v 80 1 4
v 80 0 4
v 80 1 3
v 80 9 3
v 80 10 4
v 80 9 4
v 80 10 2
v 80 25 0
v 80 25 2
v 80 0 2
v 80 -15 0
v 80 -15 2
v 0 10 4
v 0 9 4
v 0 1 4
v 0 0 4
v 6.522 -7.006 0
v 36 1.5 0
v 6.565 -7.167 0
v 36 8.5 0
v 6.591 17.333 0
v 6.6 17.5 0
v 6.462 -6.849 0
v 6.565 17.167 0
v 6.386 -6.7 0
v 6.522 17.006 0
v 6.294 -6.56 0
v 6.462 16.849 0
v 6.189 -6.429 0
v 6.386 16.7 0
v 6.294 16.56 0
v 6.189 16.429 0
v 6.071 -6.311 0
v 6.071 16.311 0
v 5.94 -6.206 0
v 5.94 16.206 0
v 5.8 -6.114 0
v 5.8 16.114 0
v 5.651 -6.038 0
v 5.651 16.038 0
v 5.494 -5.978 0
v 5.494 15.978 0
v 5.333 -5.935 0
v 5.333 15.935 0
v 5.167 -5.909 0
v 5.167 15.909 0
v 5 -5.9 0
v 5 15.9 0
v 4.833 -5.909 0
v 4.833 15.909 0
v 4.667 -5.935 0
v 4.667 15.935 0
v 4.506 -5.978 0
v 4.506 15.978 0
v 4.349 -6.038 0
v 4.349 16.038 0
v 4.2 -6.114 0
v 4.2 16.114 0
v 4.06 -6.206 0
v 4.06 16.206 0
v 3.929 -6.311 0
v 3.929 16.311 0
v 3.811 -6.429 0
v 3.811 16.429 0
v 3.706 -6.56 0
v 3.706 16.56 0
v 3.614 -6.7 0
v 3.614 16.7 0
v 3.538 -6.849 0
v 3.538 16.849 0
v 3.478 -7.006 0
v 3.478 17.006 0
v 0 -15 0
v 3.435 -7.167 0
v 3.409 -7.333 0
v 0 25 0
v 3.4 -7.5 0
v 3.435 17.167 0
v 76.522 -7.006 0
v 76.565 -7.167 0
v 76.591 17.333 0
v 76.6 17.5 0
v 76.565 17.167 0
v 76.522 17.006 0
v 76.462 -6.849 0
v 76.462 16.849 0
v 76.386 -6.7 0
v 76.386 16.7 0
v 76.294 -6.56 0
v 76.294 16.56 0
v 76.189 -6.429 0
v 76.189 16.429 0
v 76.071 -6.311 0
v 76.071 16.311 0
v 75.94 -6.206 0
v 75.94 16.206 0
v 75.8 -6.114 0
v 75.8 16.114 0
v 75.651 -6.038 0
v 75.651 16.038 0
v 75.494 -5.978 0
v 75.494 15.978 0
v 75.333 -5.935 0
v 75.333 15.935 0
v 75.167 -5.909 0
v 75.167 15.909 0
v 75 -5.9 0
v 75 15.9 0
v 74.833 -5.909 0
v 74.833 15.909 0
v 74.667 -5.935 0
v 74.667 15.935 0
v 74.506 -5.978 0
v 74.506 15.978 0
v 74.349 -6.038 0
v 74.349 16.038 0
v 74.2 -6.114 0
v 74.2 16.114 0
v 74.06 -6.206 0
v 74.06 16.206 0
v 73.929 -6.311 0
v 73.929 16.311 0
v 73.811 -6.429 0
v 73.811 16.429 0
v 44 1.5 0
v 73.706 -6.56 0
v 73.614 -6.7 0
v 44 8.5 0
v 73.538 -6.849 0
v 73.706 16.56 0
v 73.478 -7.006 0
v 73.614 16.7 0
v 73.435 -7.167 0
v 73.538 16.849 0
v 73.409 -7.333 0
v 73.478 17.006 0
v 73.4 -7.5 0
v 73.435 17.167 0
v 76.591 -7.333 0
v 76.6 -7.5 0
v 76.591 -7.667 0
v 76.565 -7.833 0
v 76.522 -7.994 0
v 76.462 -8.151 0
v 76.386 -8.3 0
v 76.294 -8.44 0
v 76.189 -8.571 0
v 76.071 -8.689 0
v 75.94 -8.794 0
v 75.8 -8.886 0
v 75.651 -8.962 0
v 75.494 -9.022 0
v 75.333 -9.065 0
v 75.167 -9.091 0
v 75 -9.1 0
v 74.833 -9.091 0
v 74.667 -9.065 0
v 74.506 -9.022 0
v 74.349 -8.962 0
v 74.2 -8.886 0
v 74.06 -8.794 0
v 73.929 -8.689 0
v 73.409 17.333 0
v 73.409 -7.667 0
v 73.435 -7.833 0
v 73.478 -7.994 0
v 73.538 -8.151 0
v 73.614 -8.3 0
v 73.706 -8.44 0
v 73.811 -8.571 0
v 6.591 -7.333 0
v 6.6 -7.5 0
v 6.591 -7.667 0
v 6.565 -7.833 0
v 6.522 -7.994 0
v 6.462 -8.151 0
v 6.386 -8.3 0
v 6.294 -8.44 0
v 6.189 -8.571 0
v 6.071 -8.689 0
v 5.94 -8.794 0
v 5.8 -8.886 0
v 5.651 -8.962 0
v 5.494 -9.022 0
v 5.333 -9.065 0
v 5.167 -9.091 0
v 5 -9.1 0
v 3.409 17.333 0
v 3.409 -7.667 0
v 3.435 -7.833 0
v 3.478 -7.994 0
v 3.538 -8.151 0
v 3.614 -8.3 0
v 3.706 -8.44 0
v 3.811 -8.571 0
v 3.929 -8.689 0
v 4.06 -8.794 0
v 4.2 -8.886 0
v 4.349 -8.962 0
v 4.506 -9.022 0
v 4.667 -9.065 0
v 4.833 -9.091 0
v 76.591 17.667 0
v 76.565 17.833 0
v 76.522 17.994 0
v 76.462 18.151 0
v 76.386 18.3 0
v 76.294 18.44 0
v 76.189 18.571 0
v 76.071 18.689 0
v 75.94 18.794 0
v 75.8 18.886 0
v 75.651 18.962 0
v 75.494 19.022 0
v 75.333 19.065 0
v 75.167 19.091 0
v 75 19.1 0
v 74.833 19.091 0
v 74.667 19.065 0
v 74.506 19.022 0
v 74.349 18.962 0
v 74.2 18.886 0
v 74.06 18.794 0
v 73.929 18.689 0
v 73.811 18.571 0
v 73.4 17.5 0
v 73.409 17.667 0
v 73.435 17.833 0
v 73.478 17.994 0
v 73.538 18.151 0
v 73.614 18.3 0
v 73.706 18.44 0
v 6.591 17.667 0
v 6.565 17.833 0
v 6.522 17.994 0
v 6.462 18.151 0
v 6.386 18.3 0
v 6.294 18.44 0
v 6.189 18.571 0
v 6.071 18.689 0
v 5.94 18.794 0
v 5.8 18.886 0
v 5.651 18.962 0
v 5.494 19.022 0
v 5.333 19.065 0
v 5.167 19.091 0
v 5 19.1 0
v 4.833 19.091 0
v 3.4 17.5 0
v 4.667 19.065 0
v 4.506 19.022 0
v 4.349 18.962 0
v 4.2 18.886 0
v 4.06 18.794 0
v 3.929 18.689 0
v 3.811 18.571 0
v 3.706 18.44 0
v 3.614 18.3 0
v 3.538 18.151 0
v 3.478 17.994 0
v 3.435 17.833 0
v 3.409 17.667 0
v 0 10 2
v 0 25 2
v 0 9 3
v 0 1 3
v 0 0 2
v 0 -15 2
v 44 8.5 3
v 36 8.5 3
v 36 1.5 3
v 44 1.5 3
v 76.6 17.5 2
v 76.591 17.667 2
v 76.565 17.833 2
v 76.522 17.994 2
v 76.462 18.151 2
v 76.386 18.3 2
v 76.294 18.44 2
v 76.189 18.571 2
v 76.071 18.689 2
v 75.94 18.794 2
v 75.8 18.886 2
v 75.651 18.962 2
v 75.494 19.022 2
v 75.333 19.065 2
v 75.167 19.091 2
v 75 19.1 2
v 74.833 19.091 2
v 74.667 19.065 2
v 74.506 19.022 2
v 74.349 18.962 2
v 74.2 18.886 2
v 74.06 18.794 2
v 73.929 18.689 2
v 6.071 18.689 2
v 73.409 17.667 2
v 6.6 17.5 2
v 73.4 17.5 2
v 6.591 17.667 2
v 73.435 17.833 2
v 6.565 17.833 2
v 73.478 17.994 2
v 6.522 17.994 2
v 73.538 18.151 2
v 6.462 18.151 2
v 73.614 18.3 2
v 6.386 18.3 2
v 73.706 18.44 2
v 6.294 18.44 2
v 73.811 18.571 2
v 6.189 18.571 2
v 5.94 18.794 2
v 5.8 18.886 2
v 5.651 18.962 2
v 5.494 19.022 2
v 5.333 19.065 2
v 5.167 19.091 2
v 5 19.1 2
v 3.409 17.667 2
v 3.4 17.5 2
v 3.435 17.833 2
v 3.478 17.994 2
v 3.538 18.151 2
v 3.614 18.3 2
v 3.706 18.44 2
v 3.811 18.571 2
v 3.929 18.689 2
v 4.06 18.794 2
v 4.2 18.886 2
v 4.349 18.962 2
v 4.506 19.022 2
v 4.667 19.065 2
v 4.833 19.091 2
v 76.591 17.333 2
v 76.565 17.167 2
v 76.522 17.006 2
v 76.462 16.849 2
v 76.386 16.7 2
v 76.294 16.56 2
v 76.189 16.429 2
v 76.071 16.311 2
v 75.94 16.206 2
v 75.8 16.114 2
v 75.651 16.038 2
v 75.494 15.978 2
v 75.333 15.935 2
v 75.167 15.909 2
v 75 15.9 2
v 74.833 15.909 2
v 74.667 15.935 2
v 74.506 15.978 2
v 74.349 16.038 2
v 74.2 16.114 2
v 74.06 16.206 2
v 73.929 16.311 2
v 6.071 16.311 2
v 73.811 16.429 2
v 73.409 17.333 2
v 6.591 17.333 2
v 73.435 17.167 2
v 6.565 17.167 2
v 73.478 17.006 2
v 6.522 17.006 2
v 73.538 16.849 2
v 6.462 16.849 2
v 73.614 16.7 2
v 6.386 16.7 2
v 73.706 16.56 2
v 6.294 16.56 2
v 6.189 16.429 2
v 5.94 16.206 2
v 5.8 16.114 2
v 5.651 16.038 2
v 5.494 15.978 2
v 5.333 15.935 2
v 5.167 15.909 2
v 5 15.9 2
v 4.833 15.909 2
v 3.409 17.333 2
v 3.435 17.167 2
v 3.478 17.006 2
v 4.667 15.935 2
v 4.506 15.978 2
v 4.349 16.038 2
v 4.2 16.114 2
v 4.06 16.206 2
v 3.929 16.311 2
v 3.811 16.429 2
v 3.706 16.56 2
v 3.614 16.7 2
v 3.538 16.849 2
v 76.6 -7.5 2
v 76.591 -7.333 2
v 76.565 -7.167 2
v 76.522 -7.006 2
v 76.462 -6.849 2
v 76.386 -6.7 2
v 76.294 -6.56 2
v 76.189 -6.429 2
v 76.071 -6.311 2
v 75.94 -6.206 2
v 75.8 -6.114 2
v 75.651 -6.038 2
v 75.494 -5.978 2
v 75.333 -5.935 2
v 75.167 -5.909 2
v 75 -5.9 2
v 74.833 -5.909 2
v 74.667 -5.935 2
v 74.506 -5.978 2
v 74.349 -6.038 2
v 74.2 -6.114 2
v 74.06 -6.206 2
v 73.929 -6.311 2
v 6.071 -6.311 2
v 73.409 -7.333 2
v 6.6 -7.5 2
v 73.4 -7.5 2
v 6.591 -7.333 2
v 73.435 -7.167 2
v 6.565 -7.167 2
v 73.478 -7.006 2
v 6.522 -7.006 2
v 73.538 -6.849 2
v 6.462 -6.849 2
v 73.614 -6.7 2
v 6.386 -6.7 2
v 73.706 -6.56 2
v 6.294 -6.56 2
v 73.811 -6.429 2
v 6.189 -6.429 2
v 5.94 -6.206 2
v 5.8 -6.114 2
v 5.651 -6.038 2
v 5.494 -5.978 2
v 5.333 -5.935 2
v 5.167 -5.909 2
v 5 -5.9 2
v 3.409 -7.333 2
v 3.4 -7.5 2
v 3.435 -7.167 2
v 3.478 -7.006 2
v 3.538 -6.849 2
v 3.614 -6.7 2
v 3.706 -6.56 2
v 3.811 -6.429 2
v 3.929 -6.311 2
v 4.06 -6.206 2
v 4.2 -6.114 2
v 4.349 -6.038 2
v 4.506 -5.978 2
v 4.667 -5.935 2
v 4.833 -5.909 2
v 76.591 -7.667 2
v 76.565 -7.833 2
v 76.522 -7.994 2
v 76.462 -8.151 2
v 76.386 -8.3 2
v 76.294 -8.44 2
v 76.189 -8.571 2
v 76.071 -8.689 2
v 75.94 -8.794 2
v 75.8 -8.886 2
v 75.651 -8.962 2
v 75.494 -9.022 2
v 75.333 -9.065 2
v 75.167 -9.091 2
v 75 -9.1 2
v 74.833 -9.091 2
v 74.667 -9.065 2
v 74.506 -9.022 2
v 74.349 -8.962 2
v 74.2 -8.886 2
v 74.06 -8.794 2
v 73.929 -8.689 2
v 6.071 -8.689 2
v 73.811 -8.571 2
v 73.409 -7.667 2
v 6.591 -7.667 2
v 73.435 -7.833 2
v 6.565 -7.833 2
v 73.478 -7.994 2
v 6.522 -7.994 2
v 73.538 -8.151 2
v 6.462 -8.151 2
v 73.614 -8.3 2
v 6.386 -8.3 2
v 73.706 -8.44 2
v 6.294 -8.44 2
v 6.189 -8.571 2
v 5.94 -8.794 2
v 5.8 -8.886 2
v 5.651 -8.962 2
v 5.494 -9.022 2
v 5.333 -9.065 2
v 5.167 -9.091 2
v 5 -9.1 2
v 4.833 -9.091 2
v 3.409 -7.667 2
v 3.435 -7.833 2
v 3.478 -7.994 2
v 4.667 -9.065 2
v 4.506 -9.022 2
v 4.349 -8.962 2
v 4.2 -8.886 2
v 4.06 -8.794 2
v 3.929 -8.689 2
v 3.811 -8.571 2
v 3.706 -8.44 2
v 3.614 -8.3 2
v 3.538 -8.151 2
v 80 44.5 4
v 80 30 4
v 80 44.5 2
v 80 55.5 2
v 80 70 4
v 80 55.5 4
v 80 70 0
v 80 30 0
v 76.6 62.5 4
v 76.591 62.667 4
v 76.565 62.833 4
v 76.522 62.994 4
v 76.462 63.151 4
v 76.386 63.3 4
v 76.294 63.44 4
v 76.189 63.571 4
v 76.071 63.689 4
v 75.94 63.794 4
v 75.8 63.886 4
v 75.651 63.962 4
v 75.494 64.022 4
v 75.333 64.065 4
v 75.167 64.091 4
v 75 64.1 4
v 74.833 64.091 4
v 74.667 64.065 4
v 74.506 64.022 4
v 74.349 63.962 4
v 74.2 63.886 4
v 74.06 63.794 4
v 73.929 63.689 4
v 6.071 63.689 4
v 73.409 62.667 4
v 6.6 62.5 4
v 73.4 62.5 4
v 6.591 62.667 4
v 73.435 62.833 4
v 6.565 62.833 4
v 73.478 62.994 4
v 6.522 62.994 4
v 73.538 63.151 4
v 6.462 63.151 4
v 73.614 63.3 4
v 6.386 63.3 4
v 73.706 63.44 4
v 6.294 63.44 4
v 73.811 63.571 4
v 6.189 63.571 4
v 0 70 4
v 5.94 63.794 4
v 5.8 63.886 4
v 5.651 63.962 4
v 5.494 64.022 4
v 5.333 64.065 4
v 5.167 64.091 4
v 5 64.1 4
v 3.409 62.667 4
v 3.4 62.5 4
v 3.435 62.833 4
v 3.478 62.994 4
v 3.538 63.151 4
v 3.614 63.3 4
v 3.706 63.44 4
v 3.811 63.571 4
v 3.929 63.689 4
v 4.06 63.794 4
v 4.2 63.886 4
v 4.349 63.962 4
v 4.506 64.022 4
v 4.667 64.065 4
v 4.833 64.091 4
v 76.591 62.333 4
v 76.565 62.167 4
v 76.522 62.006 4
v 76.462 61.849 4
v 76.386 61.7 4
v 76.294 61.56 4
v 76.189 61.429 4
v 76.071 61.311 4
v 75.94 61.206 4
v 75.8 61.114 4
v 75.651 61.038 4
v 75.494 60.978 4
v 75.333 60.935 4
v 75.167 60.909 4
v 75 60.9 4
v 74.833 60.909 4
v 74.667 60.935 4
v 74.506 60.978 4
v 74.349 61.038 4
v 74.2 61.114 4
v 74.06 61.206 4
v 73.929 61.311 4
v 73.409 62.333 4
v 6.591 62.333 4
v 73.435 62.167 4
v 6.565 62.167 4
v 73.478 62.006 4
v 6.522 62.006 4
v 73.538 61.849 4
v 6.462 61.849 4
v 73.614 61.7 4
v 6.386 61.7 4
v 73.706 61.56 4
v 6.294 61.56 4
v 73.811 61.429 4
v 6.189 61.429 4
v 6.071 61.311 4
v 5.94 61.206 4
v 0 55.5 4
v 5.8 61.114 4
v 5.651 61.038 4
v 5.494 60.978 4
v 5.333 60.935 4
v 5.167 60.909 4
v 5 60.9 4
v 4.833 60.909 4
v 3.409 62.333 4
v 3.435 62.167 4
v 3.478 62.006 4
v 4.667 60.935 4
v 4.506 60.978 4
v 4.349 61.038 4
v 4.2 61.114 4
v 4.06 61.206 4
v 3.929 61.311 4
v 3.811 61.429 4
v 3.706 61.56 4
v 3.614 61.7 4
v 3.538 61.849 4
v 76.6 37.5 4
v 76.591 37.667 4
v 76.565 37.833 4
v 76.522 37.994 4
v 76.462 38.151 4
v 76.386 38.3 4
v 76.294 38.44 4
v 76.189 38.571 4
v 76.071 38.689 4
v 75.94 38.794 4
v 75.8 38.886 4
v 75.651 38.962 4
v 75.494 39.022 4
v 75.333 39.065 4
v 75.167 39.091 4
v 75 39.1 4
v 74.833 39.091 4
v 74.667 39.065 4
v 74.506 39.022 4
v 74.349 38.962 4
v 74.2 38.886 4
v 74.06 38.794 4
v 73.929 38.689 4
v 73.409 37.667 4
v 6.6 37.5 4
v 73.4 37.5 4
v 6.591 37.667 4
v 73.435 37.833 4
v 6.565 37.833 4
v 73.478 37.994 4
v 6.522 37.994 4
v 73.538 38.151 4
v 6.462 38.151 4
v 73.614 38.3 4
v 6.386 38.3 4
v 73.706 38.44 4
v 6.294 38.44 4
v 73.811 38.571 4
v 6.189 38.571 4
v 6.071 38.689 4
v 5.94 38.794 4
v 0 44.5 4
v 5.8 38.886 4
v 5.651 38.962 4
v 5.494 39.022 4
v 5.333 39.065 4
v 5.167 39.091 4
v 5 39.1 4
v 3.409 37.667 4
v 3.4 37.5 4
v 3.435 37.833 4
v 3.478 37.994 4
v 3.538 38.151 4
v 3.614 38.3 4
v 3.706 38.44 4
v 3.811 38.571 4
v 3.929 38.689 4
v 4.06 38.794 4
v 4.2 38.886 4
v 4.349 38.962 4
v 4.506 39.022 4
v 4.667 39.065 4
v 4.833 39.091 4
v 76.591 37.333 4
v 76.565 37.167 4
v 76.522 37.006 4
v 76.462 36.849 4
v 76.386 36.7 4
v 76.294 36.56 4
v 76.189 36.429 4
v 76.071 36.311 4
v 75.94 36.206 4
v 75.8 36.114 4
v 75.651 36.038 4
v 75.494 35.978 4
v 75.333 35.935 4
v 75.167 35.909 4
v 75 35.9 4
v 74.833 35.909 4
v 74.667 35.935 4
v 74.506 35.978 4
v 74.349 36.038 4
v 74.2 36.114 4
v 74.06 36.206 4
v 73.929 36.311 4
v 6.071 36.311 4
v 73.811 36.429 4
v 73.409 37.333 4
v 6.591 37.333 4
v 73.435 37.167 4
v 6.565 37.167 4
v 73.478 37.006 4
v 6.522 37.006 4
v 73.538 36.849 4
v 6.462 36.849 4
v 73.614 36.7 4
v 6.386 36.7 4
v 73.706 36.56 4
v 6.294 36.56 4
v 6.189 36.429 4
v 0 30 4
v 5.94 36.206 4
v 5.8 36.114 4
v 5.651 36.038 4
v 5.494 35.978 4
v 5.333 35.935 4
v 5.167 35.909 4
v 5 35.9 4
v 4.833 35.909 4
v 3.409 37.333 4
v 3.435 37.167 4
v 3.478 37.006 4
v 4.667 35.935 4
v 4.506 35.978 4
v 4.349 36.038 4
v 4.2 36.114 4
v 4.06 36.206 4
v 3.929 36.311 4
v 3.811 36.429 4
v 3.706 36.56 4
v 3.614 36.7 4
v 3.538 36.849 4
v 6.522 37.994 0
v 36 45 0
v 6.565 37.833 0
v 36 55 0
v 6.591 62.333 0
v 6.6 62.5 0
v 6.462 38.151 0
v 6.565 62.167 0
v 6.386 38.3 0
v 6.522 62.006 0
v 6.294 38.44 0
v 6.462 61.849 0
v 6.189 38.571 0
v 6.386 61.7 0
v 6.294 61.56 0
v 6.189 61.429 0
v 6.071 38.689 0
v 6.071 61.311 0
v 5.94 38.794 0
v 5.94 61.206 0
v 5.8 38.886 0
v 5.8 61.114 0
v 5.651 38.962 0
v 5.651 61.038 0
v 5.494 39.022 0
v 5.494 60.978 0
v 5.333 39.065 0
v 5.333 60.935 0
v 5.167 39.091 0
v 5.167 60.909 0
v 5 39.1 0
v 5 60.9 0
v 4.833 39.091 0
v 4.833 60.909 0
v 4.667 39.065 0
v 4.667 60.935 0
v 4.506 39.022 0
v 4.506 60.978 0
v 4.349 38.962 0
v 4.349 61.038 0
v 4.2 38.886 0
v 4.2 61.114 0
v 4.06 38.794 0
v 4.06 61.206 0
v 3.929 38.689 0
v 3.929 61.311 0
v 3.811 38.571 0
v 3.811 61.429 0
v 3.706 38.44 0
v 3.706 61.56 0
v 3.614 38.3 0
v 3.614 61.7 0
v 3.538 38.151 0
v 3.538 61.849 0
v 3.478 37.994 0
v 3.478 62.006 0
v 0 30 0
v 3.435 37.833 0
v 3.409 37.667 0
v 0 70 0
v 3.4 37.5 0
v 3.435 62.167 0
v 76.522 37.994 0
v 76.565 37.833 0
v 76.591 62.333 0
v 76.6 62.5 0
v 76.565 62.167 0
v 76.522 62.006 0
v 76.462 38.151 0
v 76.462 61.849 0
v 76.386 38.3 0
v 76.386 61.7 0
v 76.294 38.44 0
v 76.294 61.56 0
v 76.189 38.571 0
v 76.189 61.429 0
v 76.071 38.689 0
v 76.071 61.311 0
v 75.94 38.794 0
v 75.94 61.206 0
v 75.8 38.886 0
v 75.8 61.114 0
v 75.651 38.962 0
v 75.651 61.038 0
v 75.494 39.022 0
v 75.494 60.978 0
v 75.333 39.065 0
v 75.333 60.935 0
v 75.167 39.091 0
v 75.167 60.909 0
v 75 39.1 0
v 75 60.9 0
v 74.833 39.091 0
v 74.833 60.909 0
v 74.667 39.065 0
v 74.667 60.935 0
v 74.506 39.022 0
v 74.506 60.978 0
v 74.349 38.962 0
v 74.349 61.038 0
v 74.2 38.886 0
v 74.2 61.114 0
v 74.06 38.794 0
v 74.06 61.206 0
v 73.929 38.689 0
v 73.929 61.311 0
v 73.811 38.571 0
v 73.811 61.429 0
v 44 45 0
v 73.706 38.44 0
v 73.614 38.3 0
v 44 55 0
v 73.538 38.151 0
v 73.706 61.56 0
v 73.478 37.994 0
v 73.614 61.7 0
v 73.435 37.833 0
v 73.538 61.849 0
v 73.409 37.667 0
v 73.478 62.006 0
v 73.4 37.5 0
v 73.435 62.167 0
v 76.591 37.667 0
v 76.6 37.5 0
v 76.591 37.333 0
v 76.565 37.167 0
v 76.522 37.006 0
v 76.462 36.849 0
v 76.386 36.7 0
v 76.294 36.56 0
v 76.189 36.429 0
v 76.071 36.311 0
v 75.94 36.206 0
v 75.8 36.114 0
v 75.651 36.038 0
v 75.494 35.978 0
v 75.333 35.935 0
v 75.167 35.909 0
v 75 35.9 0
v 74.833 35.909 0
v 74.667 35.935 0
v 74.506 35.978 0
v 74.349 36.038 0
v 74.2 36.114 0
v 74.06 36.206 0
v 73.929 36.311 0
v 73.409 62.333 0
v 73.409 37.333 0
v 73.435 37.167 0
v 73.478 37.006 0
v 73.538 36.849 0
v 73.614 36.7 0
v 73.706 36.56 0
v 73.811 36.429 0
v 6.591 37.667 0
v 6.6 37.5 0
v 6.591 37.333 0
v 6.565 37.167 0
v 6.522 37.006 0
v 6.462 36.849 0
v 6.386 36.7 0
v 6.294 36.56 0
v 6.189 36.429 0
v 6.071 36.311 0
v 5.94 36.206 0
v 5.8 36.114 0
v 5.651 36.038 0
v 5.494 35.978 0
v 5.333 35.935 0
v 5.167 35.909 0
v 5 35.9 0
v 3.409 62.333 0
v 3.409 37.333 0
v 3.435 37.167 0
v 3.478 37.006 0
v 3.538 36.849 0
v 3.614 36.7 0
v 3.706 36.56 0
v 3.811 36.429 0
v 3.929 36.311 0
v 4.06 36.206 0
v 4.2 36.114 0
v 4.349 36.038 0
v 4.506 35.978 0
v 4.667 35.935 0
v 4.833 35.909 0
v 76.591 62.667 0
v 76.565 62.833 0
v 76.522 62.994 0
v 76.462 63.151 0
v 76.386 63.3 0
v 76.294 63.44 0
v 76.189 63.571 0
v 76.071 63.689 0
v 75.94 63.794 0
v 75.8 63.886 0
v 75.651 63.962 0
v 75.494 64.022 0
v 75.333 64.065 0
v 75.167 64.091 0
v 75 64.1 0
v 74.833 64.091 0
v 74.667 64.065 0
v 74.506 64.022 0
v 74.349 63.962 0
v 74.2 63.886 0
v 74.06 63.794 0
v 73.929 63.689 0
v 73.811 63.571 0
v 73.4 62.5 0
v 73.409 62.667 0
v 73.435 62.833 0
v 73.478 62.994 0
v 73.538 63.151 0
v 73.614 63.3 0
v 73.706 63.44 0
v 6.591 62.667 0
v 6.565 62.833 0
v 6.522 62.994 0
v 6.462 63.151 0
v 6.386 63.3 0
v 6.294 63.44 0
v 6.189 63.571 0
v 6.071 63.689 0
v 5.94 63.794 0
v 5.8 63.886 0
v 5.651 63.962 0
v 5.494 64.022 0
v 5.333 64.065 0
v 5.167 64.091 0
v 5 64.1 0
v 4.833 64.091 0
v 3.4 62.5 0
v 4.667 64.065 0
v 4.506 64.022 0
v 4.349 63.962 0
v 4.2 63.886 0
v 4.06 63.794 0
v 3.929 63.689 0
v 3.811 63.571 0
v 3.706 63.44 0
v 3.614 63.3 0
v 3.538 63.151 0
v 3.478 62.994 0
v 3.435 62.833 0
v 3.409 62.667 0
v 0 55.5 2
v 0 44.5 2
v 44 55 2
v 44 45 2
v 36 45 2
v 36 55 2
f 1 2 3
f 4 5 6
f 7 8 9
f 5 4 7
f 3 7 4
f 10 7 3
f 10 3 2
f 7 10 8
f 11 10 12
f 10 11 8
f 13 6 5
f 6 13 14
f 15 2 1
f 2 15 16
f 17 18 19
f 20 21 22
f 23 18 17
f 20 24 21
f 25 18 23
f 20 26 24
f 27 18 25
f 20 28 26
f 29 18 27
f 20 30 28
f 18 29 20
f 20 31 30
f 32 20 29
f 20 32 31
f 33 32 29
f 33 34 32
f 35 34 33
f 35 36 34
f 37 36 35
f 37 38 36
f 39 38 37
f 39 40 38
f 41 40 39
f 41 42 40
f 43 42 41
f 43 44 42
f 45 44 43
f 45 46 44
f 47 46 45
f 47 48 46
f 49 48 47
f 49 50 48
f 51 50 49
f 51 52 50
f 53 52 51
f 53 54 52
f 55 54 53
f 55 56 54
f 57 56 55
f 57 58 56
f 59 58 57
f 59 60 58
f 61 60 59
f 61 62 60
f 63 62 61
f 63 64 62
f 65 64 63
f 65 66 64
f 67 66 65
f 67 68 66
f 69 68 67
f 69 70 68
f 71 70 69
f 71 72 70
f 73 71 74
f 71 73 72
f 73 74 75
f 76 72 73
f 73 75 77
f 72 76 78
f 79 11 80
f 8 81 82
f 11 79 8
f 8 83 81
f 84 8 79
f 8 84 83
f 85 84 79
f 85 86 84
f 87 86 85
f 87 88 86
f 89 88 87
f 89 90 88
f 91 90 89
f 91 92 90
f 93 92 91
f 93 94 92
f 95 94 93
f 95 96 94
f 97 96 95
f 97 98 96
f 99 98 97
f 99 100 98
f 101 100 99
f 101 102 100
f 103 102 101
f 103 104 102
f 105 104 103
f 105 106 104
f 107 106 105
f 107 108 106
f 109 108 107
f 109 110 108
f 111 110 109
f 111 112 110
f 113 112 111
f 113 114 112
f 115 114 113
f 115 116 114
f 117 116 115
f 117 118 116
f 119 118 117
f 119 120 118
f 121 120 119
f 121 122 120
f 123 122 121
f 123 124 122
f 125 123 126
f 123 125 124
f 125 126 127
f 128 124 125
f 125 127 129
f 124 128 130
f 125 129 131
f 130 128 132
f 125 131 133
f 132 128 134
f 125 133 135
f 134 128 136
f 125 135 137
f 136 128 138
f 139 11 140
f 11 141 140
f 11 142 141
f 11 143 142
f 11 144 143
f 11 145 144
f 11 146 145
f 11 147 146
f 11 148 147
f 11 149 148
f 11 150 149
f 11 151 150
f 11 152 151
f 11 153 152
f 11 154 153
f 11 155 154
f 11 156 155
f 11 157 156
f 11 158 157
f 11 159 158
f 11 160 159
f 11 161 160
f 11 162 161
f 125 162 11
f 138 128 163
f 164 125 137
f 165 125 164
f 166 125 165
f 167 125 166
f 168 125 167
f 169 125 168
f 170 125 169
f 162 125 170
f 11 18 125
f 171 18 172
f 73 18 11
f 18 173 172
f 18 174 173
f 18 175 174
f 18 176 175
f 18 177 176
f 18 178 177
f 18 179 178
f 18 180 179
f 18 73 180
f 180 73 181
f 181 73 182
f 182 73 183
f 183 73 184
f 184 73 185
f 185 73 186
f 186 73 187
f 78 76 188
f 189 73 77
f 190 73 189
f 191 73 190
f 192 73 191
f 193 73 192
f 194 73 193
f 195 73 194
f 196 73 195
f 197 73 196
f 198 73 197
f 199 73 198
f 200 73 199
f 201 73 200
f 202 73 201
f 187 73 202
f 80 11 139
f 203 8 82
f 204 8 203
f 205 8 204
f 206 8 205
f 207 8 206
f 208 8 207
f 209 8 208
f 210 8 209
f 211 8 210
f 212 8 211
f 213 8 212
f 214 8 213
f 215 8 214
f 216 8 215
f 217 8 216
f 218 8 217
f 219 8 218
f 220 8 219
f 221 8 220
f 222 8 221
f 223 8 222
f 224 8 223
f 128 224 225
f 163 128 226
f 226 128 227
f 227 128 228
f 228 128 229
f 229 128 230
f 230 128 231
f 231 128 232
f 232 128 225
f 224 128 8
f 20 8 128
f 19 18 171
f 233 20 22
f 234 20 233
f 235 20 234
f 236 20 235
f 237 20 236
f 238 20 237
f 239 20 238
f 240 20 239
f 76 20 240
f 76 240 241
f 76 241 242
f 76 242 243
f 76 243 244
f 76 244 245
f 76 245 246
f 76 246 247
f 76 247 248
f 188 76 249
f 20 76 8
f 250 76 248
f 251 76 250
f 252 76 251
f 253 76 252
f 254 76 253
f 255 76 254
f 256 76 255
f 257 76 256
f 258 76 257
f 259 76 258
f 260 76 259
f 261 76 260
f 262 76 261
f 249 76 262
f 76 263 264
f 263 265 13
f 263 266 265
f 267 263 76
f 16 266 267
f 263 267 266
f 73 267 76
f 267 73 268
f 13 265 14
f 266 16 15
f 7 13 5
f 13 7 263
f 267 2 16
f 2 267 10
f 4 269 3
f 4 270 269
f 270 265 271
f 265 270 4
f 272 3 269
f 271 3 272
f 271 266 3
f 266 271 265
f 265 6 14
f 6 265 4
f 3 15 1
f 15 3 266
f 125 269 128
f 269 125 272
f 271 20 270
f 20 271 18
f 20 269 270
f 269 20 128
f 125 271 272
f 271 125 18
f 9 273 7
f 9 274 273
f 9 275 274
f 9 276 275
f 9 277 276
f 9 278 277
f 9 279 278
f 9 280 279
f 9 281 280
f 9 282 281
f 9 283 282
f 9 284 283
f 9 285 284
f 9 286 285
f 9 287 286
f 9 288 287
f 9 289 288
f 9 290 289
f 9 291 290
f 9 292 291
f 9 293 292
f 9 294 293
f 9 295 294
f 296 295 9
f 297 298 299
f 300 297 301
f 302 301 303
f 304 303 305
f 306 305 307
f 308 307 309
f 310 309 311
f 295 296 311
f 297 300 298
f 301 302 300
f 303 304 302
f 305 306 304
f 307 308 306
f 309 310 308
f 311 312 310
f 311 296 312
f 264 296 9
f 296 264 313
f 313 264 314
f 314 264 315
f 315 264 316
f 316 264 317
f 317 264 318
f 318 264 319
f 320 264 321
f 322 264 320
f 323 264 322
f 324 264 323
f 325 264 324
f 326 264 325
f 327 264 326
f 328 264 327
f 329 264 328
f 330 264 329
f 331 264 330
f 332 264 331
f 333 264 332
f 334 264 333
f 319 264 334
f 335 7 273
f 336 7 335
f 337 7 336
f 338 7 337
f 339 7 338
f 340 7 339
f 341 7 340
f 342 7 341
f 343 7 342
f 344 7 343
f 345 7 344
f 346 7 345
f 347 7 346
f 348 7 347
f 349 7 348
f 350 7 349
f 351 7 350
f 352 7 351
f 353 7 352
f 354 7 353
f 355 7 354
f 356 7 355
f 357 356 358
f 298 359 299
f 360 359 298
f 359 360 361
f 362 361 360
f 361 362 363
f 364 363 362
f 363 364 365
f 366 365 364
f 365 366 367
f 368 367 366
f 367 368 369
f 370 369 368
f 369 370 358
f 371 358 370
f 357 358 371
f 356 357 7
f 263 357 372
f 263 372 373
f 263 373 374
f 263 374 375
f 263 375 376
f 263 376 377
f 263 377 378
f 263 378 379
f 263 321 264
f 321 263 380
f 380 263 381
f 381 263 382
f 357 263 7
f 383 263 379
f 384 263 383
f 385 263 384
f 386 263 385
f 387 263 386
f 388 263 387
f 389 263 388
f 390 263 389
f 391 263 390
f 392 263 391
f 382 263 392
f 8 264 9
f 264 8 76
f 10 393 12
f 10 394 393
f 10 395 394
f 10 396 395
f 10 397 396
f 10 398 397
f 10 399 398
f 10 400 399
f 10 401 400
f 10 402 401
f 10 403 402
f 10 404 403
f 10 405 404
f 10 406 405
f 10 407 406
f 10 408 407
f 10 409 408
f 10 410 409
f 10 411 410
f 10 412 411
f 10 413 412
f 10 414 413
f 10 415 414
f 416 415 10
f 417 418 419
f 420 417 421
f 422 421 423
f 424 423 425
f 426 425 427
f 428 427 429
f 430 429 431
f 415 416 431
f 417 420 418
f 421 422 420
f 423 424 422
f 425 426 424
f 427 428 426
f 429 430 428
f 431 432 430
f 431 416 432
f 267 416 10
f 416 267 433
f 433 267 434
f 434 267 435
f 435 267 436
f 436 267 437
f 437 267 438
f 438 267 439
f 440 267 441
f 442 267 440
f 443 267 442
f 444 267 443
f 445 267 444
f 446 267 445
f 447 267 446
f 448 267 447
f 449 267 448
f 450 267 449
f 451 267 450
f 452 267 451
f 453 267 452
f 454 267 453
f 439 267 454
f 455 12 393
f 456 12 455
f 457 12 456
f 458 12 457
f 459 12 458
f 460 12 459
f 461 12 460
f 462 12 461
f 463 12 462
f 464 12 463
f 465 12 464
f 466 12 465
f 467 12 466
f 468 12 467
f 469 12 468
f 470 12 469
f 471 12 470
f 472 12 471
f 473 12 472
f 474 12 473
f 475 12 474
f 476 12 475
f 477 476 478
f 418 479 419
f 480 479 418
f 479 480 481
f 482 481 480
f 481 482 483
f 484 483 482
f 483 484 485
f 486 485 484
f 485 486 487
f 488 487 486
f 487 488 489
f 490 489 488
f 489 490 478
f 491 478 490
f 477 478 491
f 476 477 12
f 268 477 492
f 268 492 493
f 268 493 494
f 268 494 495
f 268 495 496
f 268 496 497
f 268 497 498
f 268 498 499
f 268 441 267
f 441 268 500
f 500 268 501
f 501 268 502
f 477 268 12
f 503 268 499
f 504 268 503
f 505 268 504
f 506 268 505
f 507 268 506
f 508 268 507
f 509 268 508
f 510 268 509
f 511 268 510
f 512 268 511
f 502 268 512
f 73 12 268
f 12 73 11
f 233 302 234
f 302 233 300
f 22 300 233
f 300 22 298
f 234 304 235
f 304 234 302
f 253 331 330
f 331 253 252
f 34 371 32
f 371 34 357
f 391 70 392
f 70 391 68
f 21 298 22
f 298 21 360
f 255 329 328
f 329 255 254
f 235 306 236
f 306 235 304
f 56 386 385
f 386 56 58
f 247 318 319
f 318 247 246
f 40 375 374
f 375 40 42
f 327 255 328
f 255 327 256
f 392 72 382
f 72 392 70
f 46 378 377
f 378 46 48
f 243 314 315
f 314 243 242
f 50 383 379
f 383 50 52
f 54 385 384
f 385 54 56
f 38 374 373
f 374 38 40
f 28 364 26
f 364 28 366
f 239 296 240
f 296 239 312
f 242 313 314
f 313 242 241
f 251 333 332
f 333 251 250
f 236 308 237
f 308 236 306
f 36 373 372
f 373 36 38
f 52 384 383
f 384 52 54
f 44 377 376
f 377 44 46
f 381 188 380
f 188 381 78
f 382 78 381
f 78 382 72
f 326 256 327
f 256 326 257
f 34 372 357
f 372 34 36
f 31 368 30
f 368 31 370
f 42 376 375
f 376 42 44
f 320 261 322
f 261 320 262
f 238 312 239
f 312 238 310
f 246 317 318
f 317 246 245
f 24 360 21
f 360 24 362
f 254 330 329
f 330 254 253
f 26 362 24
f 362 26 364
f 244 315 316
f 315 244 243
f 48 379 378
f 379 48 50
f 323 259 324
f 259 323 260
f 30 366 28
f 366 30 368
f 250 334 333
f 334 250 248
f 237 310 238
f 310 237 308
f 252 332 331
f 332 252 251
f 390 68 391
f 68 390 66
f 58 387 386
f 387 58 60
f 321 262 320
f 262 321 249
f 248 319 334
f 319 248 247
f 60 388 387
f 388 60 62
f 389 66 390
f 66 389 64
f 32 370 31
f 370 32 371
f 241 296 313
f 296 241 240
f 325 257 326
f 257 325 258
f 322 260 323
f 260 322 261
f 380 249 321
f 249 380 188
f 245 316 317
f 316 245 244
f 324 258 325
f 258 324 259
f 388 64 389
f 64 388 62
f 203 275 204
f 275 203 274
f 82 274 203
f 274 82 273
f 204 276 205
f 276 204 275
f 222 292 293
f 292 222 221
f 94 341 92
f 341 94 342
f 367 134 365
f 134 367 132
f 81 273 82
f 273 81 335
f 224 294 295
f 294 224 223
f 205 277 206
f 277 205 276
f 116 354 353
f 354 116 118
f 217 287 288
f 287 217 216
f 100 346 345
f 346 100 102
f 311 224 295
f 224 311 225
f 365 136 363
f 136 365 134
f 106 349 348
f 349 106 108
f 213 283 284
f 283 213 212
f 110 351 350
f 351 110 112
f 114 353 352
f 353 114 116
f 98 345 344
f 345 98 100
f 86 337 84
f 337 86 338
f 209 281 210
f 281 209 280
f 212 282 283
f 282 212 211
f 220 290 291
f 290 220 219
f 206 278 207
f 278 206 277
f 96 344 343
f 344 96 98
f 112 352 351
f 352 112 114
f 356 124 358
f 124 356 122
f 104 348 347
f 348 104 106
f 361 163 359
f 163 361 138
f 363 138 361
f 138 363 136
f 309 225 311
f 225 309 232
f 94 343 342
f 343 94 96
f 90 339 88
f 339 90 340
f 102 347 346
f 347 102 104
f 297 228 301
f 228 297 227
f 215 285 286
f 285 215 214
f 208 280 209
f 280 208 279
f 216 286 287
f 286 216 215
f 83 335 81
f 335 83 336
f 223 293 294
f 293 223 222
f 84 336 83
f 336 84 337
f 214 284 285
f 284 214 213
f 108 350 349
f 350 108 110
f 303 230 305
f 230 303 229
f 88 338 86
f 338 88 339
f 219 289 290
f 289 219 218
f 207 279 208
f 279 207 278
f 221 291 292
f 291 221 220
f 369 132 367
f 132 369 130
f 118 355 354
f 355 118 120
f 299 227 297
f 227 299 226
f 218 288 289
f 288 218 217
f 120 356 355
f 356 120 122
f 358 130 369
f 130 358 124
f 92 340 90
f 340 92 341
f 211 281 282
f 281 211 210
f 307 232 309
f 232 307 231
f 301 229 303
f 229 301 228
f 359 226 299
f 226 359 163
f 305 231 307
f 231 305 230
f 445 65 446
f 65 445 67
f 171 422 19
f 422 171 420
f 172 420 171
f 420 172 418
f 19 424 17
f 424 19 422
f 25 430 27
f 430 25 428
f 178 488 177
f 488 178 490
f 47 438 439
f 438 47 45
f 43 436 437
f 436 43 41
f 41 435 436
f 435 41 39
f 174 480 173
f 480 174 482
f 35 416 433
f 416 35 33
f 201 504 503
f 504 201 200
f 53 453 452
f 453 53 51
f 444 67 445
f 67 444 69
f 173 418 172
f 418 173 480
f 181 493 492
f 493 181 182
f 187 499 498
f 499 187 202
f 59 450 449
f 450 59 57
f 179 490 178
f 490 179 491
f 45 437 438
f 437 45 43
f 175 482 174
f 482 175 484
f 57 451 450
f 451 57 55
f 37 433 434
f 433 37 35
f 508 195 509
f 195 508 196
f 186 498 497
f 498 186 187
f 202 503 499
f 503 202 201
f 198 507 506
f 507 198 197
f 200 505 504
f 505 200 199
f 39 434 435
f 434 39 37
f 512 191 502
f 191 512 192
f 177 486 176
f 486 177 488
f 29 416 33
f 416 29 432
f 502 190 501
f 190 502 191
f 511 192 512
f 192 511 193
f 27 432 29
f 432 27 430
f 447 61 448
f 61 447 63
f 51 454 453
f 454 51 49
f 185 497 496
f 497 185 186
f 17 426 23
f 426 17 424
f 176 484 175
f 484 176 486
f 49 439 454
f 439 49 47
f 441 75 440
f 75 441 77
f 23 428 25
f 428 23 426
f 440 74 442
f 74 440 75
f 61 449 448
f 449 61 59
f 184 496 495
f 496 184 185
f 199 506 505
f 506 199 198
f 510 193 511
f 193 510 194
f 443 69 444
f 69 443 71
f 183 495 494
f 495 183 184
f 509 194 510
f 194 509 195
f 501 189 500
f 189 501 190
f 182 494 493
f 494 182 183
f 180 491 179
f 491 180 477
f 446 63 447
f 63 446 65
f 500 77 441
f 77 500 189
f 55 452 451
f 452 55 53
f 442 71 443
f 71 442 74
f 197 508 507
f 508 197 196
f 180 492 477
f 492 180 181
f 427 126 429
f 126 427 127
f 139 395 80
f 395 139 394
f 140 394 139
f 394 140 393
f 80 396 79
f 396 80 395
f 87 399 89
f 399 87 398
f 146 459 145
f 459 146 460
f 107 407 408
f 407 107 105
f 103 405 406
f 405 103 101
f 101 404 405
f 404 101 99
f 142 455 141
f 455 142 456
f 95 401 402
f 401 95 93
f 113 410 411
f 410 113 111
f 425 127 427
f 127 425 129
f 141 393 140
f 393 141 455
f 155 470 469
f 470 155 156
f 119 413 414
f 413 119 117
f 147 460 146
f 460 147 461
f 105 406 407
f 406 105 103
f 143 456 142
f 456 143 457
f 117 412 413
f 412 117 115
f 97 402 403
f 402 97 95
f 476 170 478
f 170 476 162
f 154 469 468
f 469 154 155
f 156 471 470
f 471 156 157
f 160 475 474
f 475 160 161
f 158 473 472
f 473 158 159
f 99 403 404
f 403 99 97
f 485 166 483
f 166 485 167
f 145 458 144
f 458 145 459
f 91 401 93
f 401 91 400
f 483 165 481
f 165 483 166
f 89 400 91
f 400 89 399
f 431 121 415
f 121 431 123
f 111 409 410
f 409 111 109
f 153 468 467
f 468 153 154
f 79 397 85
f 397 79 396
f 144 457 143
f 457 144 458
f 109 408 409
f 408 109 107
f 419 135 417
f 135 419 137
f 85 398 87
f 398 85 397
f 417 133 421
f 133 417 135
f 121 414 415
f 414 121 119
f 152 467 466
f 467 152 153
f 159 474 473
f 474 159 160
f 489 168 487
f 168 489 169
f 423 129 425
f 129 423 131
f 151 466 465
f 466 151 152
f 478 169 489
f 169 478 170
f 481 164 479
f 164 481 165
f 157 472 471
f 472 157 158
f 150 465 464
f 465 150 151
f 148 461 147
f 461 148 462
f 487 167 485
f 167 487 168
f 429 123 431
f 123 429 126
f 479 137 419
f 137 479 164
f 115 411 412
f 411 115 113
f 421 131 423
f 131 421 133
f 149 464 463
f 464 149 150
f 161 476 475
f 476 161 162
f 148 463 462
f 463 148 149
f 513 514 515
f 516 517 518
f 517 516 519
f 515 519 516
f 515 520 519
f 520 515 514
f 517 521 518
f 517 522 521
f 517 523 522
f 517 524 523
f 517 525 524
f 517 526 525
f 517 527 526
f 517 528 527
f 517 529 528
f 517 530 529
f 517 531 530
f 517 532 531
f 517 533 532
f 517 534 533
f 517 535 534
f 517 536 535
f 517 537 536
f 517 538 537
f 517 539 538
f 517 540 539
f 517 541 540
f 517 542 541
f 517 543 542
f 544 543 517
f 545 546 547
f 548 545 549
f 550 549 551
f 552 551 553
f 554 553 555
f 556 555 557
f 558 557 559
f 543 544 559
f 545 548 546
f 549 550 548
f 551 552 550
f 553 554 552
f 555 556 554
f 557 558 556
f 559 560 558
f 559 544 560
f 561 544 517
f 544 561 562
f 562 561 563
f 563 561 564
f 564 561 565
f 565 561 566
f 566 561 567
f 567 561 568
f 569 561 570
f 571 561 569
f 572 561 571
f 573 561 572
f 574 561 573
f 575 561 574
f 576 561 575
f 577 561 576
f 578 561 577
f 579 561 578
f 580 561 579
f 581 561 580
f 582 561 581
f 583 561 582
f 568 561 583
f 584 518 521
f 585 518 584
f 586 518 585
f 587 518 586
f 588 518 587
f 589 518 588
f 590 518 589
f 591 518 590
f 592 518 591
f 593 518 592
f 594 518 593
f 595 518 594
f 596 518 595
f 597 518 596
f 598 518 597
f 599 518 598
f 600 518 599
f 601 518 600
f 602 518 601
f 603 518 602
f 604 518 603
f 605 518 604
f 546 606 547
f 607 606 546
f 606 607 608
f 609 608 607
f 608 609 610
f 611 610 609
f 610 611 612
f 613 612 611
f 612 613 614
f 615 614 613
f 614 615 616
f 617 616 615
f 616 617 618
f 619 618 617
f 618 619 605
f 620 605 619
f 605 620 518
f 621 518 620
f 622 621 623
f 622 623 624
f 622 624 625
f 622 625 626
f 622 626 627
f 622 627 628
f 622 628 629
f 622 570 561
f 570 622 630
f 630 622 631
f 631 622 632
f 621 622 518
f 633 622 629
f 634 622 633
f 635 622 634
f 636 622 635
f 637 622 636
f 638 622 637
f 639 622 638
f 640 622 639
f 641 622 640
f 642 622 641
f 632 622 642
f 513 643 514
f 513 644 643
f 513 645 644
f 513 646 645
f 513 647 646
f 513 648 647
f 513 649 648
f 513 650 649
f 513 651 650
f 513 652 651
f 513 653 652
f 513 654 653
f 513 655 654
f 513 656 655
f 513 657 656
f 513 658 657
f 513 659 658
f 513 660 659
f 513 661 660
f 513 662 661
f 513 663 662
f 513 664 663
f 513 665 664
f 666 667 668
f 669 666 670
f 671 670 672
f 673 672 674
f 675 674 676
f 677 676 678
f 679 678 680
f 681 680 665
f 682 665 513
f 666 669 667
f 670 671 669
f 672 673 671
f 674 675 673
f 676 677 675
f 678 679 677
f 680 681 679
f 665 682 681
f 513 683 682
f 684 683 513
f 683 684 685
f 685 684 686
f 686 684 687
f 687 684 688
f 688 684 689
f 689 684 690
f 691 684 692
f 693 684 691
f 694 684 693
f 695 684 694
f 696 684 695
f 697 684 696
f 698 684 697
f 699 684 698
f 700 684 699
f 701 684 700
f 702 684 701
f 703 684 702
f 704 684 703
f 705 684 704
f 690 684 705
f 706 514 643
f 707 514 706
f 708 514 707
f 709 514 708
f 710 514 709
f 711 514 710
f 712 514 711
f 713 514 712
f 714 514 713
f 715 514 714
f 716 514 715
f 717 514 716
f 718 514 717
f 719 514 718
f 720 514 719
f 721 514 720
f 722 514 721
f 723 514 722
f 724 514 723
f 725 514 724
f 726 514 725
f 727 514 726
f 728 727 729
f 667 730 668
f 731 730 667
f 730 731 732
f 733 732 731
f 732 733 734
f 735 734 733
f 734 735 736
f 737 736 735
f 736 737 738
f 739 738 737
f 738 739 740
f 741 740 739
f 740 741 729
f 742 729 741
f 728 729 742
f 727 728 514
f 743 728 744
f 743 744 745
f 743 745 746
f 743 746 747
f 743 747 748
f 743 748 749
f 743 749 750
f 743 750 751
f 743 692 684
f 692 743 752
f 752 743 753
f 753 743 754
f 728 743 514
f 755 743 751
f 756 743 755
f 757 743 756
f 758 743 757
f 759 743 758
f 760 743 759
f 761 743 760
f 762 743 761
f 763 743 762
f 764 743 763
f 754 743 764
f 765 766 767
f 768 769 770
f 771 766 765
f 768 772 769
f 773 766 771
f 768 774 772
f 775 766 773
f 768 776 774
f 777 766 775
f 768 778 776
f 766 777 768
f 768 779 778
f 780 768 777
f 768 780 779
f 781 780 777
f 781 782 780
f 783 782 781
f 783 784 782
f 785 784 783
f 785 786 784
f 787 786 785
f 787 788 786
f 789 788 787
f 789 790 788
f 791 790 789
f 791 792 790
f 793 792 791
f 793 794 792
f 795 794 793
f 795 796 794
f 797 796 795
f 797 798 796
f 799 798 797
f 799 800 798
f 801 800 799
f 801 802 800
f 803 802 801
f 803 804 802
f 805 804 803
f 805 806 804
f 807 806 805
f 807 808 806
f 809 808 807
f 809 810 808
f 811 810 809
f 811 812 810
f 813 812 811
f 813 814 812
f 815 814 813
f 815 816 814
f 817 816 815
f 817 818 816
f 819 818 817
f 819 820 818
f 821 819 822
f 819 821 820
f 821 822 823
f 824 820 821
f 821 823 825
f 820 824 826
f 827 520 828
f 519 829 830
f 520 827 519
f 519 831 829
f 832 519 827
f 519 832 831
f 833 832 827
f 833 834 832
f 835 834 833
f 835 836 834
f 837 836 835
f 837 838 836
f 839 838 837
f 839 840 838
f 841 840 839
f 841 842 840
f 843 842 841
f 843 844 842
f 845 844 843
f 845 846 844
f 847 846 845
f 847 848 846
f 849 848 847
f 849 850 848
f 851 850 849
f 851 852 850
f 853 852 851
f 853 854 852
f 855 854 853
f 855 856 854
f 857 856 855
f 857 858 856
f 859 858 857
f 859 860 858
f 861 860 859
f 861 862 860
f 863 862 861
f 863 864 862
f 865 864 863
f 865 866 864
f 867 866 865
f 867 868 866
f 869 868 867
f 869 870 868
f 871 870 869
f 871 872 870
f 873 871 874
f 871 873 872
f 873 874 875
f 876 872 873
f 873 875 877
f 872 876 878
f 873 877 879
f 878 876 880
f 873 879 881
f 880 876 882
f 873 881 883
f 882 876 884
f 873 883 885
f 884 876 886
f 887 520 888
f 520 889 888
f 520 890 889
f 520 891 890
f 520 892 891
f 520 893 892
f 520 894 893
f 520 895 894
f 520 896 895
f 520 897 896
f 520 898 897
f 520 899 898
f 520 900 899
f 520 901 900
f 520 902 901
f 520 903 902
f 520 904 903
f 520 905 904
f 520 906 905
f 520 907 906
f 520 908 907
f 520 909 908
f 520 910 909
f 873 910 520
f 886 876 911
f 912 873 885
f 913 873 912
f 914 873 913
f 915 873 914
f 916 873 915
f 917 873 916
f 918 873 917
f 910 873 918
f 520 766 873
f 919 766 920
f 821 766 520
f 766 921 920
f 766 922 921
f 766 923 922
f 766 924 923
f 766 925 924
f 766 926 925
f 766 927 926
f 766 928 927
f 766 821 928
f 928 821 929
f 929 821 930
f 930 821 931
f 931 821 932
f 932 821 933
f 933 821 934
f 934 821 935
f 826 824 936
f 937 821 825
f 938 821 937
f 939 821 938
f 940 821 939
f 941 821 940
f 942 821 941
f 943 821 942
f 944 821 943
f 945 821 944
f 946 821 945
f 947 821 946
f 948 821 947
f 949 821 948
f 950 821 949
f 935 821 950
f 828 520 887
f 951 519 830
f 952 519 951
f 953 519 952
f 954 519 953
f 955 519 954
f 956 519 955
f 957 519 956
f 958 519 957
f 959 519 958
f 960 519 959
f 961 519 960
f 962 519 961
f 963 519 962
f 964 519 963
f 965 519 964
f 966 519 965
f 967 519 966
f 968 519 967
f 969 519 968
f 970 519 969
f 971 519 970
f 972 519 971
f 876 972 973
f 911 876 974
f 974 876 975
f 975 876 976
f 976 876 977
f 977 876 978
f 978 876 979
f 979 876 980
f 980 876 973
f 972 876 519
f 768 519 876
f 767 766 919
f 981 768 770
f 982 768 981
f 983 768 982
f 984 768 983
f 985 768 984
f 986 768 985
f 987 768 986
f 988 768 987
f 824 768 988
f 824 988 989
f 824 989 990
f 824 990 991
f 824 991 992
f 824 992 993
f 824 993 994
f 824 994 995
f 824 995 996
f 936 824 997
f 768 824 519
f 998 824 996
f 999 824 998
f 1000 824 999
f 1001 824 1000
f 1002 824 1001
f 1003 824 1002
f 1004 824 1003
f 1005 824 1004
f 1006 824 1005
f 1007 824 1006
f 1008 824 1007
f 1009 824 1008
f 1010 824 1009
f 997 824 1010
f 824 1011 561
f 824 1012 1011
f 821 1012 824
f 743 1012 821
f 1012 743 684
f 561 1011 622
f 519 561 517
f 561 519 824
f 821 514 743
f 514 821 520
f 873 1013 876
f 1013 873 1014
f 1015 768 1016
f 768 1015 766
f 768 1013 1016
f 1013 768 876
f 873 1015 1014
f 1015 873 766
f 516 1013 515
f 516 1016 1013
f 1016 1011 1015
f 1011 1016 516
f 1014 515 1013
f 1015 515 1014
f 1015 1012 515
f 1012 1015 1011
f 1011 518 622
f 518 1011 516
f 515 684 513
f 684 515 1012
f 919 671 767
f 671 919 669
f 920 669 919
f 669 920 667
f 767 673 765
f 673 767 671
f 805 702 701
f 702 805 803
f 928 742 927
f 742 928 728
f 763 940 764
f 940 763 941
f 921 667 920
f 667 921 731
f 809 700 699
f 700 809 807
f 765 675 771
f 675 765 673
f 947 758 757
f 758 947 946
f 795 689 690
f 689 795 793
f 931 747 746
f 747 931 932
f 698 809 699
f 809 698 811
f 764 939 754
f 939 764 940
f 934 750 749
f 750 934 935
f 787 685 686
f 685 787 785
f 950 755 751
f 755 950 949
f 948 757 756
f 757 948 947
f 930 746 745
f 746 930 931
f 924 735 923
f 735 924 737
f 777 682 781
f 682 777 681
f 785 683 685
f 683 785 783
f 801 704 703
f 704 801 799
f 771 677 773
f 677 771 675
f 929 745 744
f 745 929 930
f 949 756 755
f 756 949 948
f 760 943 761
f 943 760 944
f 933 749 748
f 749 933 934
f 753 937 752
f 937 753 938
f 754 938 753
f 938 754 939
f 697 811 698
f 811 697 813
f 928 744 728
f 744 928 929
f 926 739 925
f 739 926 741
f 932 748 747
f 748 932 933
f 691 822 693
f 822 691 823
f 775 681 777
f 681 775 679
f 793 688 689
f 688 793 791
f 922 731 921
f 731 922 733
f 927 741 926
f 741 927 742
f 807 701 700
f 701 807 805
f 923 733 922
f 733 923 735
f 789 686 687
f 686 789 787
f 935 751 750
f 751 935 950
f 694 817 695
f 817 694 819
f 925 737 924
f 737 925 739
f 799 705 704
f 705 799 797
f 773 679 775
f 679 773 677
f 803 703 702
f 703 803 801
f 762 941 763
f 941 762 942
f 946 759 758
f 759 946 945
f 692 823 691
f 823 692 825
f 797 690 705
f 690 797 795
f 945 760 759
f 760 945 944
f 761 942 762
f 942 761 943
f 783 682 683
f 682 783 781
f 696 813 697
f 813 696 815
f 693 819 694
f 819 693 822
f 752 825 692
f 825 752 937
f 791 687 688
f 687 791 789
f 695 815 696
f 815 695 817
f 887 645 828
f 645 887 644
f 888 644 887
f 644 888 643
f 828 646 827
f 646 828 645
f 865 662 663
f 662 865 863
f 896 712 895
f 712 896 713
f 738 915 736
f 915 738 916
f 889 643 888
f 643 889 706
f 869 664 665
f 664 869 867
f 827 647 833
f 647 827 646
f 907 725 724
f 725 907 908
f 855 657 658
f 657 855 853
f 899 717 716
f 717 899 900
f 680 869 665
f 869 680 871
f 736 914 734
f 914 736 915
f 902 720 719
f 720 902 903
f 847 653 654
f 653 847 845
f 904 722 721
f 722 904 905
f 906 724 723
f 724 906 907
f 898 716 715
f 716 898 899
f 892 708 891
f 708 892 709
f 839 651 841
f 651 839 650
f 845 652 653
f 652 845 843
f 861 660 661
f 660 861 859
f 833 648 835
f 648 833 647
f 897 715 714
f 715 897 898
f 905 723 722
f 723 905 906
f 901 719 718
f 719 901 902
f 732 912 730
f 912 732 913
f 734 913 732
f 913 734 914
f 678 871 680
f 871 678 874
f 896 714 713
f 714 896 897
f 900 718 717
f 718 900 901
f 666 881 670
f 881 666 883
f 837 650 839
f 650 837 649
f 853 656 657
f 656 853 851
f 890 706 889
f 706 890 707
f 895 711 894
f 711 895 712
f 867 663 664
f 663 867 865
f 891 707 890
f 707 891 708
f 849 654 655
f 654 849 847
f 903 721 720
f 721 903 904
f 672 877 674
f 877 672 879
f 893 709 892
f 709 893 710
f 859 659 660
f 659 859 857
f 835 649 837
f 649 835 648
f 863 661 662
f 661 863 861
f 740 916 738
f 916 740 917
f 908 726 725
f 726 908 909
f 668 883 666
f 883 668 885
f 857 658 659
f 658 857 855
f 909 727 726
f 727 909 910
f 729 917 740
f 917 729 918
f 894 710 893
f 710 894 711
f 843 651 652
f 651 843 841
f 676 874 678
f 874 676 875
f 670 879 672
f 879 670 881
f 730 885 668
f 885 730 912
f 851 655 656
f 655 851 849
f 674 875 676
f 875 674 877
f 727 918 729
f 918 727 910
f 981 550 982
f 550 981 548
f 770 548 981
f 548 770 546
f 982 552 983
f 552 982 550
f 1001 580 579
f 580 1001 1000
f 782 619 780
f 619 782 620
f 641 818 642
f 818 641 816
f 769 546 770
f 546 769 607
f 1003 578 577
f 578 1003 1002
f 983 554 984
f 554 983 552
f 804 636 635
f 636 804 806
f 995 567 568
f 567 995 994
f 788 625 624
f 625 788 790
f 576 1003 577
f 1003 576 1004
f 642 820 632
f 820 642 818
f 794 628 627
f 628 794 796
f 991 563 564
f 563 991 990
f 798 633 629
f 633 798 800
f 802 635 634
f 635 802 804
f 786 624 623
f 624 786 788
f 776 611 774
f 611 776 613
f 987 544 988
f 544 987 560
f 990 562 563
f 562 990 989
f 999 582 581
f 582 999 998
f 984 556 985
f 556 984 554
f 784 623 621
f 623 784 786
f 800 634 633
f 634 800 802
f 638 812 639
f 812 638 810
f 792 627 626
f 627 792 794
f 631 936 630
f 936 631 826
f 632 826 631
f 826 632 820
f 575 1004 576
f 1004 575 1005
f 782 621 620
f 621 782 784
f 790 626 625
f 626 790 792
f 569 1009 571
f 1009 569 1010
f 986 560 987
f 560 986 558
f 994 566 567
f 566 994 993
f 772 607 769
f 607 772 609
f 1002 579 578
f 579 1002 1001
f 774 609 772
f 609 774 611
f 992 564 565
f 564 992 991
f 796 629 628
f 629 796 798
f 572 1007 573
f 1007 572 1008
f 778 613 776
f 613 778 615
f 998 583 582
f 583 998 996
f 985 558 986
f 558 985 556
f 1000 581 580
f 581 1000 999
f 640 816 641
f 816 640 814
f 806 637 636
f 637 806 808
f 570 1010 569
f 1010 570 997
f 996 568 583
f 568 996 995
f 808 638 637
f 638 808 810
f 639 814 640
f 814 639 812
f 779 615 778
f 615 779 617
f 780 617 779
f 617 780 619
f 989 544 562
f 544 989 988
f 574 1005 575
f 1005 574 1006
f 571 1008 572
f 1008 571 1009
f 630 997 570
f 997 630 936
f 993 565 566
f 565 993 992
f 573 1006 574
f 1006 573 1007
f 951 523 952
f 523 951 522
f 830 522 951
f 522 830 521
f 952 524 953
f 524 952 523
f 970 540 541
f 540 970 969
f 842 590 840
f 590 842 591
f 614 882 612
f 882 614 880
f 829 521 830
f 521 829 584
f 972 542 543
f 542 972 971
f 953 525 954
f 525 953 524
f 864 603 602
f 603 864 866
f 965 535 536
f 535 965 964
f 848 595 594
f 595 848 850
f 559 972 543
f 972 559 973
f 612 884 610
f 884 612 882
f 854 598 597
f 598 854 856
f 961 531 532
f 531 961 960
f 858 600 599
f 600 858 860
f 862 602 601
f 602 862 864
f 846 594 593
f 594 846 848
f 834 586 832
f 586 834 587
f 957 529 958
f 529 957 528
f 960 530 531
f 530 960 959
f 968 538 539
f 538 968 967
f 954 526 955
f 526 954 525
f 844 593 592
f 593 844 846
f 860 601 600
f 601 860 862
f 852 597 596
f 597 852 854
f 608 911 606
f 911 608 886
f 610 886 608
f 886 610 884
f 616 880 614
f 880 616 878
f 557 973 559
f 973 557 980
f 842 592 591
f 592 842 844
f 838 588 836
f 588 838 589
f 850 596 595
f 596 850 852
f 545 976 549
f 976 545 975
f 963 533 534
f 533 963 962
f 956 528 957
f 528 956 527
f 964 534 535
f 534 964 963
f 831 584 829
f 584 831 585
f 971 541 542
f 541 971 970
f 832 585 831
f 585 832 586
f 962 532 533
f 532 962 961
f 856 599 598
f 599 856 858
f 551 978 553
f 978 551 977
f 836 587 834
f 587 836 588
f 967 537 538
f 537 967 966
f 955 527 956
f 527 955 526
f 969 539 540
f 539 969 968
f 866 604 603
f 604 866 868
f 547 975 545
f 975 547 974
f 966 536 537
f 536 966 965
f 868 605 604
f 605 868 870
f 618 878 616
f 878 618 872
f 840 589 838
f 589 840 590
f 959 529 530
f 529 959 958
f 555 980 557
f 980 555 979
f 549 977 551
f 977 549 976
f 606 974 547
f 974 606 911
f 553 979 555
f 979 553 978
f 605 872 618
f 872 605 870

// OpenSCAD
$fn=60;
gate_w=80;
gate();
translate([0,30,0])

// rotate([180,0,0])
cover();
module gate() {
    difference(){
        cube([gate_w,10,4]);
        translate([0,1,3])
            cube([gate_w,8,2]);
        translate([gate_w/2-(8/2),1.5])
            cube([8,7,4]);
    }
    difference (){
        union() {
            translate([0,10,0])
                cube([gate_w,15,2]);
            translate([0,-15,0])
                cube([gate_w,15,2]);
        }
        translate([5,17.5,0])
            cylinder(r=1.6,h=2);
        translate([gate_w-5,17.5,0])
            cylinder(r=1.6,h=2);
        translate([5,-7.5,0])
            cylinder(r=1.6,h=2);
        translate([gate_w-5,-7.5,0])
            cylinder(r=1.6,h=2);
    }
}

module cover() {
    difference(){
        cube([gate_w,40,4]);
        translate([gate_w/2-(8/2),20-5])
            cube([8,10,4]);
        translate([0,14.5,2])
            cube([gate_w,11,2]);
        translate([5,7.5,0])
            cylinder(r=1.6,h=4);
        translate([gate_w-5,7.5,0])
            cylinder(r=1.6,h=4);
        translate([5,32.5,0])
            cylinder(r=1.6,h=4);
        translate([gate_w-5,32.5,0])
            cylinder(r=1.6,h=4);
    }
        
    }
